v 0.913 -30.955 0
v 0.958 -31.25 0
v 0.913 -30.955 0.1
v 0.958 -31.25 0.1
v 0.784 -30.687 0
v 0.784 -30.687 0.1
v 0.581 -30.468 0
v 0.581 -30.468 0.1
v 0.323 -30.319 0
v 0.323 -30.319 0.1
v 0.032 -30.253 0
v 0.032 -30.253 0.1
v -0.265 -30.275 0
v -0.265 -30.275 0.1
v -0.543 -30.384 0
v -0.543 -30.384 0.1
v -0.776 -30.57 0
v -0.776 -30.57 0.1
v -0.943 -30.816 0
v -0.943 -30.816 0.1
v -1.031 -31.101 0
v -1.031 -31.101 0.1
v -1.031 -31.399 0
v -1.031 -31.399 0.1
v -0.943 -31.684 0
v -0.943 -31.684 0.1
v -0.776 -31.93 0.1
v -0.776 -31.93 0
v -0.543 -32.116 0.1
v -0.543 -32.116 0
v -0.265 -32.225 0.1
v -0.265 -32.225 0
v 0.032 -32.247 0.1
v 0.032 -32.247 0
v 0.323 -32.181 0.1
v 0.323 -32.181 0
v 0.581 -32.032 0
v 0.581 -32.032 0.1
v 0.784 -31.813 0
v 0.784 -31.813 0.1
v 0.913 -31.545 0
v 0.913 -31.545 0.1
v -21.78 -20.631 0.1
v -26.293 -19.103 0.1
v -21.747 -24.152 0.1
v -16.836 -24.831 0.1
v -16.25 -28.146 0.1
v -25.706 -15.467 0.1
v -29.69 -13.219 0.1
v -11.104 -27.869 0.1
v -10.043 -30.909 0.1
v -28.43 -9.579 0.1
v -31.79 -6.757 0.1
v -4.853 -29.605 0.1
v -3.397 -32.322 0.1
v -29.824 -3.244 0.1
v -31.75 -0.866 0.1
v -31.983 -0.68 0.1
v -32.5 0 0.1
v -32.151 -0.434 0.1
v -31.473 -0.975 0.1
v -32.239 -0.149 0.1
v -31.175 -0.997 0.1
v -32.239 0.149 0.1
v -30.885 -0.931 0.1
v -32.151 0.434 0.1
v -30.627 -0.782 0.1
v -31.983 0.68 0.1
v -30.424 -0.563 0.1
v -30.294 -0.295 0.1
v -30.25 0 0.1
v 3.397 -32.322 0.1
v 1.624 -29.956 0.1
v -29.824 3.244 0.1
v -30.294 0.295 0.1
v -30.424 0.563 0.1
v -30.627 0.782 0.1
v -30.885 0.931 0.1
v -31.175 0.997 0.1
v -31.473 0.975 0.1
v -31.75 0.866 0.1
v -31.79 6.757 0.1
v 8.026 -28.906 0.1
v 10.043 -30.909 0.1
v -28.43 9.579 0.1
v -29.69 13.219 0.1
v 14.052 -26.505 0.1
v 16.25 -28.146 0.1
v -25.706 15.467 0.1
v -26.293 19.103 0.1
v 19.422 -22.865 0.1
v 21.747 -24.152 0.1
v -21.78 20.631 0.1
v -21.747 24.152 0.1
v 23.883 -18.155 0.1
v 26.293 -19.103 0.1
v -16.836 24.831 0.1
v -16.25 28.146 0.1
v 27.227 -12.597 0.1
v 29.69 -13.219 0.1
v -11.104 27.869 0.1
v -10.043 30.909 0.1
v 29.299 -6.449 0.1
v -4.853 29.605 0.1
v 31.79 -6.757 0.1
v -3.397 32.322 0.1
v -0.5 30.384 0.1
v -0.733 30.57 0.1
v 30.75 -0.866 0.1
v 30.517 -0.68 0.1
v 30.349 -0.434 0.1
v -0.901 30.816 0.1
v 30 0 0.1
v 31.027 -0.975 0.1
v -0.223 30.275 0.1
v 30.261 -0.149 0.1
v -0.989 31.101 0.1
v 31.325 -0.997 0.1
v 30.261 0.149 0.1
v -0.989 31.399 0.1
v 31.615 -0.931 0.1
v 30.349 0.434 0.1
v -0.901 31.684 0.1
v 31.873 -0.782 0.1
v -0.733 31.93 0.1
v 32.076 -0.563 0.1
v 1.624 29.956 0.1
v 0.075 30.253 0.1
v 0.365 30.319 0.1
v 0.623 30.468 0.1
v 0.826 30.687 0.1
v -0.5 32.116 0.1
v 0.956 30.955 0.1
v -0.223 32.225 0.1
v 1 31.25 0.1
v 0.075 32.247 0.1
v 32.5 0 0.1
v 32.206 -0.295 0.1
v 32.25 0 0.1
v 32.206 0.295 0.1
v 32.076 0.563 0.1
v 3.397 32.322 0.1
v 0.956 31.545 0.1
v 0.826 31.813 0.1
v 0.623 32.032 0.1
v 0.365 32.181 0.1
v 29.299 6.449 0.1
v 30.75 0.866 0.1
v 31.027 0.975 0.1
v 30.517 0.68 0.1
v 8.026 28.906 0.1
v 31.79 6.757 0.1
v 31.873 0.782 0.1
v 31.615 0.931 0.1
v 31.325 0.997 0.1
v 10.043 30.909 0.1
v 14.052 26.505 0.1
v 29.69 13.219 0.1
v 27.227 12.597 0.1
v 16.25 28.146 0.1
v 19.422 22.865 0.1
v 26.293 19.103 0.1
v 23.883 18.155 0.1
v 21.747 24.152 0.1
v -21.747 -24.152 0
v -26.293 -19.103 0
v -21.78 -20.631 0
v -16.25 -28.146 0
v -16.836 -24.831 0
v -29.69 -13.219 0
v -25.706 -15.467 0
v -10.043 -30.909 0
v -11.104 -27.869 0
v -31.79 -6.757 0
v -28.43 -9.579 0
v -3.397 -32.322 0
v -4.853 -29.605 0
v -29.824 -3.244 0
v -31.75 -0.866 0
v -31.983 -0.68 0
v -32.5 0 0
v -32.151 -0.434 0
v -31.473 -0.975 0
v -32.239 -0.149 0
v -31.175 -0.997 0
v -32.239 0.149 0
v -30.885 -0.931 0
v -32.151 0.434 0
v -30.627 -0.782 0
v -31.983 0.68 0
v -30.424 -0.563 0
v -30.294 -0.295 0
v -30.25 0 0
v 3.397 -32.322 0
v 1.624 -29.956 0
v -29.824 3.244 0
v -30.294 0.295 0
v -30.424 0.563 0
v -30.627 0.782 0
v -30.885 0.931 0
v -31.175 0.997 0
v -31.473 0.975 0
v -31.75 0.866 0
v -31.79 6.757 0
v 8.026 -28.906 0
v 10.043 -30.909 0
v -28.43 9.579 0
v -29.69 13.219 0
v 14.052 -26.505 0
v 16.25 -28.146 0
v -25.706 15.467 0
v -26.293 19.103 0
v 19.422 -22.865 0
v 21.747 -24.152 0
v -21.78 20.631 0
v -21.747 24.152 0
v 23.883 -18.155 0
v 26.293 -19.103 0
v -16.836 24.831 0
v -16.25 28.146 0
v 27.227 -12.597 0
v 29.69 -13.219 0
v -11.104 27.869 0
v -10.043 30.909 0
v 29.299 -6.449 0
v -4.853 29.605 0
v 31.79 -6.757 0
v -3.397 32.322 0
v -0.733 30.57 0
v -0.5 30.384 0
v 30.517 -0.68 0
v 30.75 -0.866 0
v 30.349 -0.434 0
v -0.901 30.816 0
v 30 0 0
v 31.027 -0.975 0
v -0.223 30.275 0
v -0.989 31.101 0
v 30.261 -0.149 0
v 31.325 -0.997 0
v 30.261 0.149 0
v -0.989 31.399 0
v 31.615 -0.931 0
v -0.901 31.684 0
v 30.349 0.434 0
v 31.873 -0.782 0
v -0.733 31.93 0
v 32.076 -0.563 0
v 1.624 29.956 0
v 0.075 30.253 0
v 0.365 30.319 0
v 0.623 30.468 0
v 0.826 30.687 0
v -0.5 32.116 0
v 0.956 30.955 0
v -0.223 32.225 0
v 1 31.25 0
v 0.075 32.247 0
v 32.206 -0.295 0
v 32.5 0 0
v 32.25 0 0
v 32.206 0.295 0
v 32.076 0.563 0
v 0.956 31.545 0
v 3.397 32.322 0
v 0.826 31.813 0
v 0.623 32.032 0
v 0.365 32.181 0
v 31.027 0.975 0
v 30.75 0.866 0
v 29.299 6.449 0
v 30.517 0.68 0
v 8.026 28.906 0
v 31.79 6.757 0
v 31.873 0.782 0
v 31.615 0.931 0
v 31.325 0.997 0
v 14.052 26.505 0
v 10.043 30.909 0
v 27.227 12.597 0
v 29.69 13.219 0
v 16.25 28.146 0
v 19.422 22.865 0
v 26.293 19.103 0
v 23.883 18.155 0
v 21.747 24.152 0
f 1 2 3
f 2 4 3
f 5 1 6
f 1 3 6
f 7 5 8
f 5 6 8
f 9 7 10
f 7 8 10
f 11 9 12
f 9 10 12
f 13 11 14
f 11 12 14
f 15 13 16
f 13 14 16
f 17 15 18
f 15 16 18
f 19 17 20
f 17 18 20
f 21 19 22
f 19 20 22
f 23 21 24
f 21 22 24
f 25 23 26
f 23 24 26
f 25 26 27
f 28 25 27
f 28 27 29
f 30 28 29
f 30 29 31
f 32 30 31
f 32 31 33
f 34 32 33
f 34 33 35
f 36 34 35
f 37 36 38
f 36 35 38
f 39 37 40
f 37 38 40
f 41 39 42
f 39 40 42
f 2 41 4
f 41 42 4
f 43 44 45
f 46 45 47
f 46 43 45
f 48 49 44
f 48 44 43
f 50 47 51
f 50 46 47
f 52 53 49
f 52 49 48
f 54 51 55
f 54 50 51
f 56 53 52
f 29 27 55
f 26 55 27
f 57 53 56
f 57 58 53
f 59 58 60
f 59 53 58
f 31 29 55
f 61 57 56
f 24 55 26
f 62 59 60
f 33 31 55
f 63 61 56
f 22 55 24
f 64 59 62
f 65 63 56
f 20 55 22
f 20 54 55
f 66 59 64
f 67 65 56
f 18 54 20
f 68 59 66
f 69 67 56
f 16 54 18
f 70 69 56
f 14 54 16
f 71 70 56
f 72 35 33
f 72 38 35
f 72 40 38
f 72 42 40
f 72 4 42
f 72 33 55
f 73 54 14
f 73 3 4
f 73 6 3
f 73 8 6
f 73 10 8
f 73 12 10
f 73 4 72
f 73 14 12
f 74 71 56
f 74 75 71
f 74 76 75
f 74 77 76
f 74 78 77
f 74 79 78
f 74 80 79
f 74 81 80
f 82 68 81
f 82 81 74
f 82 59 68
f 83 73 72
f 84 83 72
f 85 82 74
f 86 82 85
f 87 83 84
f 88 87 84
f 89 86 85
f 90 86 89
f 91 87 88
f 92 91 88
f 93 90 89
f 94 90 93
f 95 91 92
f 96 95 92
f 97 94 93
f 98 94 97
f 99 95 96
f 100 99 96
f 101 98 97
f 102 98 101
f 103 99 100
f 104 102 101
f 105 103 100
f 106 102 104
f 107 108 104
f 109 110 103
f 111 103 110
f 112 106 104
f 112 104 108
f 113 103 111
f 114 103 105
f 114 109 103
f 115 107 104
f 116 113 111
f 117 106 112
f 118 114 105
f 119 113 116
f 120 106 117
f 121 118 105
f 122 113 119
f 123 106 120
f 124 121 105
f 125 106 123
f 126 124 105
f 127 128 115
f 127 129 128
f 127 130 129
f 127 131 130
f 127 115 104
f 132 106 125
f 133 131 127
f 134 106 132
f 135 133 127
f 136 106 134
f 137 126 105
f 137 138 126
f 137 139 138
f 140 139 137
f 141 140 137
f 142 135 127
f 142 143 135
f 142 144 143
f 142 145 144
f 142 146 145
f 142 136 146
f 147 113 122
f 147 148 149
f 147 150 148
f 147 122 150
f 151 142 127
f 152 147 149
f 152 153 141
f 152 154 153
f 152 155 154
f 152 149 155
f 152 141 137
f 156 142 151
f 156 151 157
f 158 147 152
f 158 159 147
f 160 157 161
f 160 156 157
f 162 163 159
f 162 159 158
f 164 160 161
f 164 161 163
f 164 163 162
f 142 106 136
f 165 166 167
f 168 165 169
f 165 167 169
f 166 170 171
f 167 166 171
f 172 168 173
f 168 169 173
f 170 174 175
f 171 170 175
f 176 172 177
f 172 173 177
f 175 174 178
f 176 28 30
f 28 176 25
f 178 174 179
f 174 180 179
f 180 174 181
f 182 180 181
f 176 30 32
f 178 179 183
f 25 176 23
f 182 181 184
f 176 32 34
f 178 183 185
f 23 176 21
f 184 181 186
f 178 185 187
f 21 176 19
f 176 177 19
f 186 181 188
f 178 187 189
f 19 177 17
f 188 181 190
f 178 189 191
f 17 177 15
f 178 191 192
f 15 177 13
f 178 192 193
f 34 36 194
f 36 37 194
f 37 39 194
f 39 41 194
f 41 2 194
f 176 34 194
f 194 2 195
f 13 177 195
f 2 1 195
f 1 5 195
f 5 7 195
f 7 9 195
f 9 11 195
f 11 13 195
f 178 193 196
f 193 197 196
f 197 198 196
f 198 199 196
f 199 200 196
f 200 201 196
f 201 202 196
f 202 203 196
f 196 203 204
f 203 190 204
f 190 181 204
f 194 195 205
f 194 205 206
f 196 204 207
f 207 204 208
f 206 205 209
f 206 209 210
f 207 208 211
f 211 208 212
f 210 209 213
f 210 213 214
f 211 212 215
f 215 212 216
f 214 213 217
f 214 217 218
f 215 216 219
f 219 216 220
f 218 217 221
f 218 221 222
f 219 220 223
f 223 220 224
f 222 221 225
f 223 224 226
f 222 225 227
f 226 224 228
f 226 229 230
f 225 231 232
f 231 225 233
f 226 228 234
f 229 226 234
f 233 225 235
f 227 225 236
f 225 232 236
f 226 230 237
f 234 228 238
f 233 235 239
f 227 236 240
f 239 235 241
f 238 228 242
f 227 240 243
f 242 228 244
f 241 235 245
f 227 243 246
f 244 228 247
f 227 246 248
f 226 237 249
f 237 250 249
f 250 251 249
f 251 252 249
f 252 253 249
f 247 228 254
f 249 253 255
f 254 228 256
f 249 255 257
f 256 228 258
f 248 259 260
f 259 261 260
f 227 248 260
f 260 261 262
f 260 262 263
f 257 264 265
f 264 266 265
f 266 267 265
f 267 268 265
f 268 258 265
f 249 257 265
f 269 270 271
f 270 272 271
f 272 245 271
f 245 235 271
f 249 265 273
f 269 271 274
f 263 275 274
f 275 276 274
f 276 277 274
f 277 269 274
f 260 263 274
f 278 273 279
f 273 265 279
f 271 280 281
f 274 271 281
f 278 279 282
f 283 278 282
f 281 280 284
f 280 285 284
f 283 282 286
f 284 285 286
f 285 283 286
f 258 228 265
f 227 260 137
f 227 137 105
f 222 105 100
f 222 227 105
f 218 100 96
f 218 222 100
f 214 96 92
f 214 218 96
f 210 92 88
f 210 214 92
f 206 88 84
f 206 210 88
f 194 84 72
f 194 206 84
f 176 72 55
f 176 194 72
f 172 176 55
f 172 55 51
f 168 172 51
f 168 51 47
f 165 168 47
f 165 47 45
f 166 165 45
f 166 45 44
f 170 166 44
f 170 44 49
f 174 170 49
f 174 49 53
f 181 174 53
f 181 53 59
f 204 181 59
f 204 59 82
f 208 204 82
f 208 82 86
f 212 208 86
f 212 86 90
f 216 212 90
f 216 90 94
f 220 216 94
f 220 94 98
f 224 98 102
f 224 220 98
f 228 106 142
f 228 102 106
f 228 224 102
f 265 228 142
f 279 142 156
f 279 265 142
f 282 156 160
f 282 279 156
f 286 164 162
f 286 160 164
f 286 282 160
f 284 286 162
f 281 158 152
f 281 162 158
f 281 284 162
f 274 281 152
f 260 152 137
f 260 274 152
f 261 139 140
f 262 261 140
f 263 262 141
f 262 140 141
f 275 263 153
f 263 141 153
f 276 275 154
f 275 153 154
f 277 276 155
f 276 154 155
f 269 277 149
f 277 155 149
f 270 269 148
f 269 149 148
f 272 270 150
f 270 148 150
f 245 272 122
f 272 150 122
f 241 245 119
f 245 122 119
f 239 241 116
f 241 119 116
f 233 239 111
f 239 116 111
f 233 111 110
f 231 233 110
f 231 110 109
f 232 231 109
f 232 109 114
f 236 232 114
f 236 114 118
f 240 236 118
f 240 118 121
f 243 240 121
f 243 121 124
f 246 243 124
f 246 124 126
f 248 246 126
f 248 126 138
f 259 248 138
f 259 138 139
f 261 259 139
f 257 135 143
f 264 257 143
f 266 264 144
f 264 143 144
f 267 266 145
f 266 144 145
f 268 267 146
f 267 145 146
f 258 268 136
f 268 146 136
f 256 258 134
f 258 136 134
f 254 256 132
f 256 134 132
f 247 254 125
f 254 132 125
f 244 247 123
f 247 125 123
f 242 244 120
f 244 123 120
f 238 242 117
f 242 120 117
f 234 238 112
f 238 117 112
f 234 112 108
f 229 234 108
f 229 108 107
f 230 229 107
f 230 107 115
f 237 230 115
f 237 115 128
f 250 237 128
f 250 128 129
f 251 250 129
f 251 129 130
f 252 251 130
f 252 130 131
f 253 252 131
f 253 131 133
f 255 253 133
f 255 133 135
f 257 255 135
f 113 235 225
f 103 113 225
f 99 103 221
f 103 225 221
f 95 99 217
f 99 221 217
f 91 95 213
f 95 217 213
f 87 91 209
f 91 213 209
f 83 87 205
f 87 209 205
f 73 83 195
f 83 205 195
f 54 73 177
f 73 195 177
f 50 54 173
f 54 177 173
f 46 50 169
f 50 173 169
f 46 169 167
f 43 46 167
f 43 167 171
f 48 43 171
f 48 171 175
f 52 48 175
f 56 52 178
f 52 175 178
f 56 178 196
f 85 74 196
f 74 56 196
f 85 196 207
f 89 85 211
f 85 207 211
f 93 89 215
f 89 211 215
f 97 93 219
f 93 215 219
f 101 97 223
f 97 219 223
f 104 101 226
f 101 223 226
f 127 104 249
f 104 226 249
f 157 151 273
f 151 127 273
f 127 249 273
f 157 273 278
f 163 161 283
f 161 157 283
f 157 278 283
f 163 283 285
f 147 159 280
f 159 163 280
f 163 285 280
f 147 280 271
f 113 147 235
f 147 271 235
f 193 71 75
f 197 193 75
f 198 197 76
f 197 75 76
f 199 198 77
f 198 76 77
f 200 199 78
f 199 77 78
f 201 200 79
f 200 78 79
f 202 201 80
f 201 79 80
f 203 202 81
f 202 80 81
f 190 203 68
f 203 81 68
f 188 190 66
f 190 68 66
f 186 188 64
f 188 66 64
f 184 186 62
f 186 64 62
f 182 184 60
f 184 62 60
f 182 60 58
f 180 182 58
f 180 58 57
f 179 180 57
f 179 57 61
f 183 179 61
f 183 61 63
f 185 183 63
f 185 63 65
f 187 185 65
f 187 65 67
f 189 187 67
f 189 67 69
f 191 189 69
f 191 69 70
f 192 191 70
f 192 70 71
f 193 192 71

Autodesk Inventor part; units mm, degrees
ref_plane "YZ Plane" through (0, 0, 0) normal (1, 0, 0) x (0, 1, 0)
ref_plane "XZ Plane" through (0, 0, 0) normal (0, 1, 0) x (-1, 0, 0)
ref_plane "XY Plane" through (0, 0, 0) normal (0, 0, 1) x (1, 0, 0)
sketch "Sketch1" plane through (0, 0, 0) normal (0, 0, 1) x (1, 0, 0)
  circle A0 centre (0, 0) radius 30
  circle A1 centre (0, 0) radius 32.5
  dimension "d0" = 60
  dimension "d1" = 2.5
extrude "Extrusion1" add sketch "Sketch1" along normal blind 0.1
sketch "Sketch2" plane through (0, 0, 0.1) normal (0, 0, 1) x (1, 0, 0)
  circle A0 centre (0, 31.25) radius 1
  circle A1 centre (0, 0) radius 32.5 projected
  circle A2 centre (31.25, 0) radius 1
  circle A3 centre (-31.25, 0) radius 1
  circle A4 centre (-0.0425, -31.25) radius 1
  dimension "d4" = 2
  dimension "d5" = 0.25
  dimension "d6" = 2
  dimension "d7" = 0.25
  dimension "d8" = 2
  dimension "d9" = 0.25
  dimension "d10" = 2
  dimension "d11" = 0.25
extrude "Extrusion2" cut sketch "Sketch2" against normal blind 0.2 contours A0 | A2 | A3 | A4
properties part number "cage_electrode"
